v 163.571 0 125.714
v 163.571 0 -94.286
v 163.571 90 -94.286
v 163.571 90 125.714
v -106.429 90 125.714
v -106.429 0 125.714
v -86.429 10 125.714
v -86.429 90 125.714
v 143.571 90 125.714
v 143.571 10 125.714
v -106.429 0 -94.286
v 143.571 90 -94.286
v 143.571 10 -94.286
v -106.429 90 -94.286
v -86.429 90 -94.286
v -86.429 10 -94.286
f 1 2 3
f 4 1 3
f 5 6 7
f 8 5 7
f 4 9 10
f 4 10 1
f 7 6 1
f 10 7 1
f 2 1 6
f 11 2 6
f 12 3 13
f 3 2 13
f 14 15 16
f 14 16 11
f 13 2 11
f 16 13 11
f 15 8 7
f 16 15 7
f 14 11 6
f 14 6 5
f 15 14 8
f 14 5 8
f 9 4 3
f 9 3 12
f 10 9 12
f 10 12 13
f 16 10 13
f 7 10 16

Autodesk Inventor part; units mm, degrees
ref_plane "YZ Plane" through (0, 0, 0) normal (1, 0, 0) x (0, 1, 0)
ref_plane "XZ Plane" through (0, 0, 0) normal (0, 1, 0) x (-1, 0, 0)
ref_plane "XY Plane" through (0, 0, 0) normal (0, 0, 1) x (1, 0, 0)
sketch "Sketch1" plane through (0, 0, 0) normal (0, 1, 0) x (-1, 0, 0)
  line L0 (86.4286, 125.7143) -> (-143.5714, 125.7143)
  line L1 (-143.5714, 125.7143) -> (-143.5714, -94.2857)
  line L2 (-143.5714, -94.2857) -> (86.4286, -94.2857)
  line L3 (86.4286, -94.2857) -> (86.4286, 125.7143)
  point P0 (0, 0)
  dimension "d0" = 220
  dimension "d1" = 230
extrude "Extrusion1" add sketch "Sketch1" along normal blind 10
sketch "Sketch5" plane through (-86.4286, 0, 125.7143) normal (0, 0, 1) x (1, 0, 0)
  line L0 (0, 0) -> (0, 10) projected
  line L1 (0, 0) -> (-20, 0)
  line L2 (-20, 0) -> (-20, 90)
  line L3 (-20, 90) -> (0, 90)
  line L4 (0, 90) -> (0, 0)
  line L5 (230, 0) -> (0, 0) projected
  line L6 (230, 0) -> (250, 0)
  line L7 (250, 0) -> (250, 90)
  line L8 (250, 90) -> (230, 90)
  line L9 (230, 90) -> (230, 0)
  point P0 (86.4286, 0)
  dimension "d22" = 90
  dimension "d23" = 20
  dimension "d24" = 20
extrude "Extrusion5" add sketch "Sketch5" against normal up to surface (220 mm away)
properties part number "Podkladka" material "Aluminum 6061"
